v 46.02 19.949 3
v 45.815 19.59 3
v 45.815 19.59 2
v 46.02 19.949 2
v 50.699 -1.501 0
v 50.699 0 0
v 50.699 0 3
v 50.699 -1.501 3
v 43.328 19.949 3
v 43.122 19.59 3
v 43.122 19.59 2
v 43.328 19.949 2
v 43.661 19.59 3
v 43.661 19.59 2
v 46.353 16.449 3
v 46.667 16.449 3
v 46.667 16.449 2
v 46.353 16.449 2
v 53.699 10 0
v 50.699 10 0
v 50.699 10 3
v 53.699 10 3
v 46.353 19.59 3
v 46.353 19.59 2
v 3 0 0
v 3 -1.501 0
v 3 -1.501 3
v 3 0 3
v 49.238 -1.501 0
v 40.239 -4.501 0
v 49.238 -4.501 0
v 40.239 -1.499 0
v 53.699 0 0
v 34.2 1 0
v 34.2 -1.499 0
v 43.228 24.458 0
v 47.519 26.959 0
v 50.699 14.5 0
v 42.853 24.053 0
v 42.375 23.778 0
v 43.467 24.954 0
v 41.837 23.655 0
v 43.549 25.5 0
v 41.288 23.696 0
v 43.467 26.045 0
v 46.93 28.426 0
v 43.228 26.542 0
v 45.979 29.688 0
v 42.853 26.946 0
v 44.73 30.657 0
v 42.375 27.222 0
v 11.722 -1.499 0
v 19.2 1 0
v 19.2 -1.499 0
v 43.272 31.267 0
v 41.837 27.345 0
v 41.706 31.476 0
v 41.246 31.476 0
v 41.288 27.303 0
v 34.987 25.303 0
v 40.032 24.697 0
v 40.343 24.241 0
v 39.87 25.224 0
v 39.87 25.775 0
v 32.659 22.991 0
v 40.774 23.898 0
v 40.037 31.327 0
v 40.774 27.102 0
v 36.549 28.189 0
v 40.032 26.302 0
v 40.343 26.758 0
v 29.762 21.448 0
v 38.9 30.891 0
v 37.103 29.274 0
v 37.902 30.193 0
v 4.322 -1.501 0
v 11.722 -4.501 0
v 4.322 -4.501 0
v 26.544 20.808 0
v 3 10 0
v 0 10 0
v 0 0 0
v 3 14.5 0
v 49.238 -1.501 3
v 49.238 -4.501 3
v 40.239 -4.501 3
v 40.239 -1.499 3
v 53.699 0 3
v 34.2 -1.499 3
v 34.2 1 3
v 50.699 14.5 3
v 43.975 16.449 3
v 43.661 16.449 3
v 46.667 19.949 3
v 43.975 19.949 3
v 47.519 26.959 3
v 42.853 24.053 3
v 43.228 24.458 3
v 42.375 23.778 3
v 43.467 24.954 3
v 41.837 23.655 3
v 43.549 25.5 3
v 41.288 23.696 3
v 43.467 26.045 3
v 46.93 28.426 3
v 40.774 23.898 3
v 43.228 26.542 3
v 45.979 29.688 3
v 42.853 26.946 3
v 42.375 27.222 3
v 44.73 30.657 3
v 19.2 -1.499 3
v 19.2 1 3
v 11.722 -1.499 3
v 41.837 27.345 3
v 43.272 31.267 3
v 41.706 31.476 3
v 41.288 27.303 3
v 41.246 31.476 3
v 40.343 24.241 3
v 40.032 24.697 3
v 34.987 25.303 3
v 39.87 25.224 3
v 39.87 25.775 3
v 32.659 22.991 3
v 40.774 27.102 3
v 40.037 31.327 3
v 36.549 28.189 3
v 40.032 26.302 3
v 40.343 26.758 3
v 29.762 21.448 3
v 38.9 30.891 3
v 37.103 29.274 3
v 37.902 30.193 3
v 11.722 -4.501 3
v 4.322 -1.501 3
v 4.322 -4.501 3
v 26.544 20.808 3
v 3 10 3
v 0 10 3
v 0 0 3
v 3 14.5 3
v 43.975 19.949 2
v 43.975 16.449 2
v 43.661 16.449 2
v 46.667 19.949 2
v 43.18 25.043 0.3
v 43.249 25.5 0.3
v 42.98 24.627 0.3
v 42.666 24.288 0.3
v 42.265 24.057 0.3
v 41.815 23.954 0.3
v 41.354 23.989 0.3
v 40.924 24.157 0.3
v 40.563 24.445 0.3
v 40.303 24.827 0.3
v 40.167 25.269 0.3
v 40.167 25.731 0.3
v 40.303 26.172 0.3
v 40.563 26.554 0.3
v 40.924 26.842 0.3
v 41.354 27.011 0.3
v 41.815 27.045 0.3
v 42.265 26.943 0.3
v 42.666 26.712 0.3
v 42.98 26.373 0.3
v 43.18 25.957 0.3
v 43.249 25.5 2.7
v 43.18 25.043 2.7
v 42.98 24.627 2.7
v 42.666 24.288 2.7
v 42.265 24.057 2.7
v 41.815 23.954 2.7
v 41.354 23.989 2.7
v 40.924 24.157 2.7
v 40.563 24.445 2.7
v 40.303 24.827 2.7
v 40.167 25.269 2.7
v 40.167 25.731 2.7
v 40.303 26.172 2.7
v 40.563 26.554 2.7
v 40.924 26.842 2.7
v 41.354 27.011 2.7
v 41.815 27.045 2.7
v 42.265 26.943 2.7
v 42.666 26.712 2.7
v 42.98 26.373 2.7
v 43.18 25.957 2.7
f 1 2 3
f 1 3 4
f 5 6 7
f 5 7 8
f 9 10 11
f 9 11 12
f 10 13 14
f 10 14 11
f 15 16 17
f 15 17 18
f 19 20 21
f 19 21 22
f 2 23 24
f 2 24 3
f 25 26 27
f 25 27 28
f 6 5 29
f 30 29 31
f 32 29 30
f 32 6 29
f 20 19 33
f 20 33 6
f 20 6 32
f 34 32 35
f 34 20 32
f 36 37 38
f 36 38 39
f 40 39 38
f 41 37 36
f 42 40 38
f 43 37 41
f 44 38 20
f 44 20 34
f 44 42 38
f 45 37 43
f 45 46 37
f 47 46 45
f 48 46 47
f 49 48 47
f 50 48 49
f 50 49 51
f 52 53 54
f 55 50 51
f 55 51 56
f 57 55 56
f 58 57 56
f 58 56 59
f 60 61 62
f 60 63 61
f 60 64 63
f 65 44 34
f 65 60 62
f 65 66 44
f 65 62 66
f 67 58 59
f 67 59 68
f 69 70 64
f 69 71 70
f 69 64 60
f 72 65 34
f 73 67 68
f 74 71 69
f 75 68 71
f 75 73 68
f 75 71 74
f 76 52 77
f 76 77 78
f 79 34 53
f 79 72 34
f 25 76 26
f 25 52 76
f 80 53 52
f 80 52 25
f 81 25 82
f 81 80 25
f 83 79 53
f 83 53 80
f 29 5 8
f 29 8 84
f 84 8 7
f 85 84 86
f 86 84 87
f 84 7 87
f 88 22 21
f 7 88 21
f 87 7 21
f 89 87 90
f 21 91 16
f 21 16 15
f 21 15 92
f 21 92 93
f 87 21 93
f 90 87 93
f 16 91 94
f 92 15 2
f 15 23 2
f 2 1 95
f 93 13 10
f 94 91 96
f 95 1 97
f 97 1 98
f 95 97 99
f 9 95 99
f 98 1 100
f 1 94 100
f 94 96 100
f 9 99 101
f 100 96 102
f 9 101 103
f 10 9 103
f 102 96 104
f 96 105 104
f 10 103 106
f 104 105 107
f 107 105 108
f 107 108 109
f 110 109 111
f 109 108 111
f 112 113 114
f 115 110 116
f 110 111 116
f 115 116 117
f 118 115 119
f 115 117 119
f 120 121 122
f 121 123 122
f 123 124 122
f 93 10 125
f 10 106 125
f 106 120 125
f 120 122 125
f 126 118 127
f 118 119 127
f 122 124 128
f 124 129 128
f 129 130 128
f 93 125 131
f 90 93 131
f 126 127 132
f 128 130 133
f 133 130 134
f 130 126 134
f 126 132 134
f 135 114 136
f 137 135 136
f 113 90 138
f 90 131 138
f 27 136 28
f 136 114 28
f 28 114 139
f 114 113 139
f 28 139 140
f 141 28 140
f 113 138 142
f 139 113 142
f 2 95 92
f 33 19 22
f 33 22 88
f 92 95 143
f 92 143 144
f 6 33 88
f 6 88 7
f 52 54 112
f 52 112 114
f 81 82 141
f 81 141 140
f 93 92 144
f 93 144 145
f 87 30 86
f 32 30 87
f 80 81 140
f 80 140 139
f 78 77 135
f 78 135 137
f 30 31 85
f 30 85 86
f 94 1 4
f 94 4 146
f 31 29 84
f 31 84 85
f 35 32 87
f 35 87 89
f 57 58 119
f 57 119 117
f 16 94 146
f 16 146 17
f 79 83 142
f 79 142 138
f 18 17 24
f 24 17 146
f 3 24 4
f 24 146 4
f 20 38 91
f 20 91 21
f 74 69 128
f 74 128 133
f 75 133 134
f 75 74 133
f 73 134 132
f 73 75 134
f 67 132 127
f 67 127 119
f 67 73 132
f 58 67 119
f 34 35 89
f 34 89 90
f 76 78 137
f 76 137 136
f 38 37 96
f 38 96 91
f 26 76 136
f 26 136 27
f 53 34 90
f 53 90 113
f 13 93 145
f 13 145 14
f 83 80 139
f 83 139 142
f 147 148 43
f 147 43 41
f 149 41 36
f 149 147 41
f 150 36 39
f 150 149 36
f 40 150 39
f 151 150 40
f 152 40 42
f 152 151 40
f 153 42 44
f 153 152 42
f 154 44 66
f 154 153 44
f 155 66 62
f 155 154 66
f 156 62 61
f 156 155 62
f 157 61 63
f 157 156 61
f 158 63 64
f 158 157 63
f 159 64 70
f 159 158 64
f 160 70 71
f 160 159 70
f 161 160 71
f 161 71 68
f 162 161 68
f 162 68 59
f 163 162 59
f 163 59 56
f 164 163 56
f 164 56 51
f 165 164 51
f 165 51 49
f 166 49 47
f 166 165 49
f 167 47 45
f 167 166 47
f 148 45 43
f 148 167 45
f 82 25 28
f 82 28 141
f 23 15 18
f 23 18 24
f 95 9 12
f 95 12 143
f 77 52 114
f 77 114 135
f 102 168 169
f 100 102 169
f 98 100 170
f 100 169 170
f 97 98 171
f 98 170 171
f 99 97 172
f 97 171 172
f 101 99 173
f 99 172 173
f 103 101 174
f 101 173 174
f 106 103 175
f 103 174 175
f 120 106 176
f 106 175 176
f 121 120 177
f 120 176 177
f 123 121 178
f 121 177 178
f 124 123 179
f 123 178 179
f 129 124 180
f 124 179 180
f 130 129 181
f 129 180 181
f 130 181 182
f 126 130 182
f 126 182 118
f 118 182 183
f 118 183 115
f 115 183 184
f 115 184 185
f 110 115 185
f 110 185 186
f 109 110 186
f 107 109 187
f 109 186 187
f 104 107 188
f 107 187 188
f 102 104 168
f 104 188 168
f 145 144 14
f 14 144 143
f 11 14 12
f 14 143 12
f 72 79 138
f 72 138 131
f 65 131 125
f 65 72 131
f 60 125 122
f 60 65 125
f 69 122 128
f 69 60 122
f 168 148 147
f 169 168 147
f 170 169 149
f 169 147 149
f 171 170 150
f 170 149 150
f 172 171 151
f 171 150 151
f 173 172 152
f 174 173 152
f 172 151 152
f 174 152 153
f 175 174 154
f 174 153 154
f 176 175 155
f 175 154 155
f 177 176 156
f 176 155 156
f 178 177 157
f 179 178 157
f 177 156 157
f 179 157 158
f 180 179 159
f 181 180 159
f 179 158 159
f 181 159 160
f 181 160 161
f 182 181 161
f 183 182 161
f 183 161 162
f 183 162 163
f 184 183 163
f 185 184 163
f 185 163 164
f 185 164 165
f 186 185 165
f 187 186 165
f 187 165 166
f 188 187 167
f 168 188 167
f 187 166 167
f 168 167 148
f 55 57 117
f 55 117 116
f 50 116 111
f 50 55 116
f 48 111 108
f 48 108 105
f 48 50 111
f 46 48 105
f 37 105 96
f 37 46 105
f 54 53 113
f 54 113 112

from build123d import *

# Parameters (mm, degrees)
SKETCH_1_R          = 1.55
EXTRUDE_1_DEPTH     = 3
CUT_EXTRUDE_1_DEPTH = 1
CHAMFER_1_SIZE      = 0.3


with BuildPart() as part:
    # 草图1 → 凸台-拉伸1 (new body)
    with BuildSketch(Plane(origin=(0, 0, 0), x_dir=(-1, 0, 0), z_dir=(0, 0, -1))):
        with BuildLine():
            Line((-47.519320255, 26.959319012), (-50.6992, 14.4996))
            Line((-50.6992, 14.4996), (-50.6992, 10.0003))
            Line((-50.6992, 10.0003), (-53.6992, 10.0003))
            Line((-53.6992, 10.0003), (-53.6992, 0))
            Line((-53.6992, 0), (-50.6992, 0))
            Line((-50.6992, 0), (-50.6992, -1.5007))
            Line((-50.6992, -1.5007), (-49.2382, -1.5007))
            Line((-49.2382, -1.5007), (-49.2382, -4.5007))
            Line((-49.2382, -4.5007), (-40.2392, -4.5007))
            Line((-40.2392, -4.5007), (-40.2392, -1.4993))
            Line((-40.2392, -1.4993), (-34.2002, -1.4993))
            Line((-34.2002, -1.4993), (-34.2002, 1.0005))
            Line((-34.2002, 1.0005), (-19.2003, 1.0005))
            Line((-19.2003, 1.0005), (-19.2003, -1.4993))
            Line((-19.2003, -1.4993), (-11.7217, -1.4993))
            Line((-11.7217, -1.4993), (-11.7217, -4.5007))
            Line((-11.7217, -4.5007), (-4.3215, -4.5007))
            Line((-4.3215, -4.5007), (-4.3215, -1.5007))
            Line((-4.3215, -1.5007), (-3, -1.5007))
            Line((-3, -1.5007), (-3, 0))
            Line((-3, 0), (0, 0))
            Line((0, 0), (0, 10.0003))
            Line((0, 10.0003), (-3, 10.0003))
            Line((-3, 10.0003), (-3, 14.4996))
            Line((-3, 14.4996), (-26.543543046, 20.807804388))
            ThreePointArc((-26.543543046, 20.807804388), (-32.65852857, 22.990550509), (-36.548909006, 28.188854909))
            ThreePointArc((-36.548909006, 28.188854909), (-38.379715818, 30.572322748), (-41.246222879, 31.4756))
            Line((-41.246222879, 31.4756), (-41.70566582, 31.4756))
            ThreePointArc((-41.70566582, 31.4756), (-45.386541118, 30.213865193), (-47.519320255, 26.959319012))
        make_face()
        with Locations(Location((-41.6992, 25.49975, 0), (0, 0, 180))):
            Circle(SKETCH_1_R, mode=Mode.SUBTRACT)
    extrude(amount=-EXTRUDE_1_DEPTH)

    # 草图2 → 切除-拉伸1 (cut)
    with BuildSketch(Plane.XY.offset(3)):
        Polygon((43.327916651, 19.948770062), (43.975052068, 19.948770062), (43.975052068, 16.448770062), (43.660949504, 16.448770062), (43.660949504, 19.589795703), (43.122487965, 19.589795703), align=None)
        Polygon((46.020224344, 19.948770062), (46.66735976, 19.948770062), (46.66735976, 16.448770062), (46.353257196, 16.448770062), (46.353257196, 19.589795703), (45.814795658, 19.589795703), align=None)
    extrude(amount=-CUT_EXTRUDE_1_DEPTH, mode=Mode.SUBTRACT)

    # 倒角1
    chamfer_1_edges = [part.edges().sort_by_distance(p)[0] for p in [
        (40.1492, 25.49975, 3),
        (40.1492, 25.49975, 0),
    ]]
    chamfer(chamfer_1_edges, length=CHAMFER_1_SIZE)


solid = part.part
